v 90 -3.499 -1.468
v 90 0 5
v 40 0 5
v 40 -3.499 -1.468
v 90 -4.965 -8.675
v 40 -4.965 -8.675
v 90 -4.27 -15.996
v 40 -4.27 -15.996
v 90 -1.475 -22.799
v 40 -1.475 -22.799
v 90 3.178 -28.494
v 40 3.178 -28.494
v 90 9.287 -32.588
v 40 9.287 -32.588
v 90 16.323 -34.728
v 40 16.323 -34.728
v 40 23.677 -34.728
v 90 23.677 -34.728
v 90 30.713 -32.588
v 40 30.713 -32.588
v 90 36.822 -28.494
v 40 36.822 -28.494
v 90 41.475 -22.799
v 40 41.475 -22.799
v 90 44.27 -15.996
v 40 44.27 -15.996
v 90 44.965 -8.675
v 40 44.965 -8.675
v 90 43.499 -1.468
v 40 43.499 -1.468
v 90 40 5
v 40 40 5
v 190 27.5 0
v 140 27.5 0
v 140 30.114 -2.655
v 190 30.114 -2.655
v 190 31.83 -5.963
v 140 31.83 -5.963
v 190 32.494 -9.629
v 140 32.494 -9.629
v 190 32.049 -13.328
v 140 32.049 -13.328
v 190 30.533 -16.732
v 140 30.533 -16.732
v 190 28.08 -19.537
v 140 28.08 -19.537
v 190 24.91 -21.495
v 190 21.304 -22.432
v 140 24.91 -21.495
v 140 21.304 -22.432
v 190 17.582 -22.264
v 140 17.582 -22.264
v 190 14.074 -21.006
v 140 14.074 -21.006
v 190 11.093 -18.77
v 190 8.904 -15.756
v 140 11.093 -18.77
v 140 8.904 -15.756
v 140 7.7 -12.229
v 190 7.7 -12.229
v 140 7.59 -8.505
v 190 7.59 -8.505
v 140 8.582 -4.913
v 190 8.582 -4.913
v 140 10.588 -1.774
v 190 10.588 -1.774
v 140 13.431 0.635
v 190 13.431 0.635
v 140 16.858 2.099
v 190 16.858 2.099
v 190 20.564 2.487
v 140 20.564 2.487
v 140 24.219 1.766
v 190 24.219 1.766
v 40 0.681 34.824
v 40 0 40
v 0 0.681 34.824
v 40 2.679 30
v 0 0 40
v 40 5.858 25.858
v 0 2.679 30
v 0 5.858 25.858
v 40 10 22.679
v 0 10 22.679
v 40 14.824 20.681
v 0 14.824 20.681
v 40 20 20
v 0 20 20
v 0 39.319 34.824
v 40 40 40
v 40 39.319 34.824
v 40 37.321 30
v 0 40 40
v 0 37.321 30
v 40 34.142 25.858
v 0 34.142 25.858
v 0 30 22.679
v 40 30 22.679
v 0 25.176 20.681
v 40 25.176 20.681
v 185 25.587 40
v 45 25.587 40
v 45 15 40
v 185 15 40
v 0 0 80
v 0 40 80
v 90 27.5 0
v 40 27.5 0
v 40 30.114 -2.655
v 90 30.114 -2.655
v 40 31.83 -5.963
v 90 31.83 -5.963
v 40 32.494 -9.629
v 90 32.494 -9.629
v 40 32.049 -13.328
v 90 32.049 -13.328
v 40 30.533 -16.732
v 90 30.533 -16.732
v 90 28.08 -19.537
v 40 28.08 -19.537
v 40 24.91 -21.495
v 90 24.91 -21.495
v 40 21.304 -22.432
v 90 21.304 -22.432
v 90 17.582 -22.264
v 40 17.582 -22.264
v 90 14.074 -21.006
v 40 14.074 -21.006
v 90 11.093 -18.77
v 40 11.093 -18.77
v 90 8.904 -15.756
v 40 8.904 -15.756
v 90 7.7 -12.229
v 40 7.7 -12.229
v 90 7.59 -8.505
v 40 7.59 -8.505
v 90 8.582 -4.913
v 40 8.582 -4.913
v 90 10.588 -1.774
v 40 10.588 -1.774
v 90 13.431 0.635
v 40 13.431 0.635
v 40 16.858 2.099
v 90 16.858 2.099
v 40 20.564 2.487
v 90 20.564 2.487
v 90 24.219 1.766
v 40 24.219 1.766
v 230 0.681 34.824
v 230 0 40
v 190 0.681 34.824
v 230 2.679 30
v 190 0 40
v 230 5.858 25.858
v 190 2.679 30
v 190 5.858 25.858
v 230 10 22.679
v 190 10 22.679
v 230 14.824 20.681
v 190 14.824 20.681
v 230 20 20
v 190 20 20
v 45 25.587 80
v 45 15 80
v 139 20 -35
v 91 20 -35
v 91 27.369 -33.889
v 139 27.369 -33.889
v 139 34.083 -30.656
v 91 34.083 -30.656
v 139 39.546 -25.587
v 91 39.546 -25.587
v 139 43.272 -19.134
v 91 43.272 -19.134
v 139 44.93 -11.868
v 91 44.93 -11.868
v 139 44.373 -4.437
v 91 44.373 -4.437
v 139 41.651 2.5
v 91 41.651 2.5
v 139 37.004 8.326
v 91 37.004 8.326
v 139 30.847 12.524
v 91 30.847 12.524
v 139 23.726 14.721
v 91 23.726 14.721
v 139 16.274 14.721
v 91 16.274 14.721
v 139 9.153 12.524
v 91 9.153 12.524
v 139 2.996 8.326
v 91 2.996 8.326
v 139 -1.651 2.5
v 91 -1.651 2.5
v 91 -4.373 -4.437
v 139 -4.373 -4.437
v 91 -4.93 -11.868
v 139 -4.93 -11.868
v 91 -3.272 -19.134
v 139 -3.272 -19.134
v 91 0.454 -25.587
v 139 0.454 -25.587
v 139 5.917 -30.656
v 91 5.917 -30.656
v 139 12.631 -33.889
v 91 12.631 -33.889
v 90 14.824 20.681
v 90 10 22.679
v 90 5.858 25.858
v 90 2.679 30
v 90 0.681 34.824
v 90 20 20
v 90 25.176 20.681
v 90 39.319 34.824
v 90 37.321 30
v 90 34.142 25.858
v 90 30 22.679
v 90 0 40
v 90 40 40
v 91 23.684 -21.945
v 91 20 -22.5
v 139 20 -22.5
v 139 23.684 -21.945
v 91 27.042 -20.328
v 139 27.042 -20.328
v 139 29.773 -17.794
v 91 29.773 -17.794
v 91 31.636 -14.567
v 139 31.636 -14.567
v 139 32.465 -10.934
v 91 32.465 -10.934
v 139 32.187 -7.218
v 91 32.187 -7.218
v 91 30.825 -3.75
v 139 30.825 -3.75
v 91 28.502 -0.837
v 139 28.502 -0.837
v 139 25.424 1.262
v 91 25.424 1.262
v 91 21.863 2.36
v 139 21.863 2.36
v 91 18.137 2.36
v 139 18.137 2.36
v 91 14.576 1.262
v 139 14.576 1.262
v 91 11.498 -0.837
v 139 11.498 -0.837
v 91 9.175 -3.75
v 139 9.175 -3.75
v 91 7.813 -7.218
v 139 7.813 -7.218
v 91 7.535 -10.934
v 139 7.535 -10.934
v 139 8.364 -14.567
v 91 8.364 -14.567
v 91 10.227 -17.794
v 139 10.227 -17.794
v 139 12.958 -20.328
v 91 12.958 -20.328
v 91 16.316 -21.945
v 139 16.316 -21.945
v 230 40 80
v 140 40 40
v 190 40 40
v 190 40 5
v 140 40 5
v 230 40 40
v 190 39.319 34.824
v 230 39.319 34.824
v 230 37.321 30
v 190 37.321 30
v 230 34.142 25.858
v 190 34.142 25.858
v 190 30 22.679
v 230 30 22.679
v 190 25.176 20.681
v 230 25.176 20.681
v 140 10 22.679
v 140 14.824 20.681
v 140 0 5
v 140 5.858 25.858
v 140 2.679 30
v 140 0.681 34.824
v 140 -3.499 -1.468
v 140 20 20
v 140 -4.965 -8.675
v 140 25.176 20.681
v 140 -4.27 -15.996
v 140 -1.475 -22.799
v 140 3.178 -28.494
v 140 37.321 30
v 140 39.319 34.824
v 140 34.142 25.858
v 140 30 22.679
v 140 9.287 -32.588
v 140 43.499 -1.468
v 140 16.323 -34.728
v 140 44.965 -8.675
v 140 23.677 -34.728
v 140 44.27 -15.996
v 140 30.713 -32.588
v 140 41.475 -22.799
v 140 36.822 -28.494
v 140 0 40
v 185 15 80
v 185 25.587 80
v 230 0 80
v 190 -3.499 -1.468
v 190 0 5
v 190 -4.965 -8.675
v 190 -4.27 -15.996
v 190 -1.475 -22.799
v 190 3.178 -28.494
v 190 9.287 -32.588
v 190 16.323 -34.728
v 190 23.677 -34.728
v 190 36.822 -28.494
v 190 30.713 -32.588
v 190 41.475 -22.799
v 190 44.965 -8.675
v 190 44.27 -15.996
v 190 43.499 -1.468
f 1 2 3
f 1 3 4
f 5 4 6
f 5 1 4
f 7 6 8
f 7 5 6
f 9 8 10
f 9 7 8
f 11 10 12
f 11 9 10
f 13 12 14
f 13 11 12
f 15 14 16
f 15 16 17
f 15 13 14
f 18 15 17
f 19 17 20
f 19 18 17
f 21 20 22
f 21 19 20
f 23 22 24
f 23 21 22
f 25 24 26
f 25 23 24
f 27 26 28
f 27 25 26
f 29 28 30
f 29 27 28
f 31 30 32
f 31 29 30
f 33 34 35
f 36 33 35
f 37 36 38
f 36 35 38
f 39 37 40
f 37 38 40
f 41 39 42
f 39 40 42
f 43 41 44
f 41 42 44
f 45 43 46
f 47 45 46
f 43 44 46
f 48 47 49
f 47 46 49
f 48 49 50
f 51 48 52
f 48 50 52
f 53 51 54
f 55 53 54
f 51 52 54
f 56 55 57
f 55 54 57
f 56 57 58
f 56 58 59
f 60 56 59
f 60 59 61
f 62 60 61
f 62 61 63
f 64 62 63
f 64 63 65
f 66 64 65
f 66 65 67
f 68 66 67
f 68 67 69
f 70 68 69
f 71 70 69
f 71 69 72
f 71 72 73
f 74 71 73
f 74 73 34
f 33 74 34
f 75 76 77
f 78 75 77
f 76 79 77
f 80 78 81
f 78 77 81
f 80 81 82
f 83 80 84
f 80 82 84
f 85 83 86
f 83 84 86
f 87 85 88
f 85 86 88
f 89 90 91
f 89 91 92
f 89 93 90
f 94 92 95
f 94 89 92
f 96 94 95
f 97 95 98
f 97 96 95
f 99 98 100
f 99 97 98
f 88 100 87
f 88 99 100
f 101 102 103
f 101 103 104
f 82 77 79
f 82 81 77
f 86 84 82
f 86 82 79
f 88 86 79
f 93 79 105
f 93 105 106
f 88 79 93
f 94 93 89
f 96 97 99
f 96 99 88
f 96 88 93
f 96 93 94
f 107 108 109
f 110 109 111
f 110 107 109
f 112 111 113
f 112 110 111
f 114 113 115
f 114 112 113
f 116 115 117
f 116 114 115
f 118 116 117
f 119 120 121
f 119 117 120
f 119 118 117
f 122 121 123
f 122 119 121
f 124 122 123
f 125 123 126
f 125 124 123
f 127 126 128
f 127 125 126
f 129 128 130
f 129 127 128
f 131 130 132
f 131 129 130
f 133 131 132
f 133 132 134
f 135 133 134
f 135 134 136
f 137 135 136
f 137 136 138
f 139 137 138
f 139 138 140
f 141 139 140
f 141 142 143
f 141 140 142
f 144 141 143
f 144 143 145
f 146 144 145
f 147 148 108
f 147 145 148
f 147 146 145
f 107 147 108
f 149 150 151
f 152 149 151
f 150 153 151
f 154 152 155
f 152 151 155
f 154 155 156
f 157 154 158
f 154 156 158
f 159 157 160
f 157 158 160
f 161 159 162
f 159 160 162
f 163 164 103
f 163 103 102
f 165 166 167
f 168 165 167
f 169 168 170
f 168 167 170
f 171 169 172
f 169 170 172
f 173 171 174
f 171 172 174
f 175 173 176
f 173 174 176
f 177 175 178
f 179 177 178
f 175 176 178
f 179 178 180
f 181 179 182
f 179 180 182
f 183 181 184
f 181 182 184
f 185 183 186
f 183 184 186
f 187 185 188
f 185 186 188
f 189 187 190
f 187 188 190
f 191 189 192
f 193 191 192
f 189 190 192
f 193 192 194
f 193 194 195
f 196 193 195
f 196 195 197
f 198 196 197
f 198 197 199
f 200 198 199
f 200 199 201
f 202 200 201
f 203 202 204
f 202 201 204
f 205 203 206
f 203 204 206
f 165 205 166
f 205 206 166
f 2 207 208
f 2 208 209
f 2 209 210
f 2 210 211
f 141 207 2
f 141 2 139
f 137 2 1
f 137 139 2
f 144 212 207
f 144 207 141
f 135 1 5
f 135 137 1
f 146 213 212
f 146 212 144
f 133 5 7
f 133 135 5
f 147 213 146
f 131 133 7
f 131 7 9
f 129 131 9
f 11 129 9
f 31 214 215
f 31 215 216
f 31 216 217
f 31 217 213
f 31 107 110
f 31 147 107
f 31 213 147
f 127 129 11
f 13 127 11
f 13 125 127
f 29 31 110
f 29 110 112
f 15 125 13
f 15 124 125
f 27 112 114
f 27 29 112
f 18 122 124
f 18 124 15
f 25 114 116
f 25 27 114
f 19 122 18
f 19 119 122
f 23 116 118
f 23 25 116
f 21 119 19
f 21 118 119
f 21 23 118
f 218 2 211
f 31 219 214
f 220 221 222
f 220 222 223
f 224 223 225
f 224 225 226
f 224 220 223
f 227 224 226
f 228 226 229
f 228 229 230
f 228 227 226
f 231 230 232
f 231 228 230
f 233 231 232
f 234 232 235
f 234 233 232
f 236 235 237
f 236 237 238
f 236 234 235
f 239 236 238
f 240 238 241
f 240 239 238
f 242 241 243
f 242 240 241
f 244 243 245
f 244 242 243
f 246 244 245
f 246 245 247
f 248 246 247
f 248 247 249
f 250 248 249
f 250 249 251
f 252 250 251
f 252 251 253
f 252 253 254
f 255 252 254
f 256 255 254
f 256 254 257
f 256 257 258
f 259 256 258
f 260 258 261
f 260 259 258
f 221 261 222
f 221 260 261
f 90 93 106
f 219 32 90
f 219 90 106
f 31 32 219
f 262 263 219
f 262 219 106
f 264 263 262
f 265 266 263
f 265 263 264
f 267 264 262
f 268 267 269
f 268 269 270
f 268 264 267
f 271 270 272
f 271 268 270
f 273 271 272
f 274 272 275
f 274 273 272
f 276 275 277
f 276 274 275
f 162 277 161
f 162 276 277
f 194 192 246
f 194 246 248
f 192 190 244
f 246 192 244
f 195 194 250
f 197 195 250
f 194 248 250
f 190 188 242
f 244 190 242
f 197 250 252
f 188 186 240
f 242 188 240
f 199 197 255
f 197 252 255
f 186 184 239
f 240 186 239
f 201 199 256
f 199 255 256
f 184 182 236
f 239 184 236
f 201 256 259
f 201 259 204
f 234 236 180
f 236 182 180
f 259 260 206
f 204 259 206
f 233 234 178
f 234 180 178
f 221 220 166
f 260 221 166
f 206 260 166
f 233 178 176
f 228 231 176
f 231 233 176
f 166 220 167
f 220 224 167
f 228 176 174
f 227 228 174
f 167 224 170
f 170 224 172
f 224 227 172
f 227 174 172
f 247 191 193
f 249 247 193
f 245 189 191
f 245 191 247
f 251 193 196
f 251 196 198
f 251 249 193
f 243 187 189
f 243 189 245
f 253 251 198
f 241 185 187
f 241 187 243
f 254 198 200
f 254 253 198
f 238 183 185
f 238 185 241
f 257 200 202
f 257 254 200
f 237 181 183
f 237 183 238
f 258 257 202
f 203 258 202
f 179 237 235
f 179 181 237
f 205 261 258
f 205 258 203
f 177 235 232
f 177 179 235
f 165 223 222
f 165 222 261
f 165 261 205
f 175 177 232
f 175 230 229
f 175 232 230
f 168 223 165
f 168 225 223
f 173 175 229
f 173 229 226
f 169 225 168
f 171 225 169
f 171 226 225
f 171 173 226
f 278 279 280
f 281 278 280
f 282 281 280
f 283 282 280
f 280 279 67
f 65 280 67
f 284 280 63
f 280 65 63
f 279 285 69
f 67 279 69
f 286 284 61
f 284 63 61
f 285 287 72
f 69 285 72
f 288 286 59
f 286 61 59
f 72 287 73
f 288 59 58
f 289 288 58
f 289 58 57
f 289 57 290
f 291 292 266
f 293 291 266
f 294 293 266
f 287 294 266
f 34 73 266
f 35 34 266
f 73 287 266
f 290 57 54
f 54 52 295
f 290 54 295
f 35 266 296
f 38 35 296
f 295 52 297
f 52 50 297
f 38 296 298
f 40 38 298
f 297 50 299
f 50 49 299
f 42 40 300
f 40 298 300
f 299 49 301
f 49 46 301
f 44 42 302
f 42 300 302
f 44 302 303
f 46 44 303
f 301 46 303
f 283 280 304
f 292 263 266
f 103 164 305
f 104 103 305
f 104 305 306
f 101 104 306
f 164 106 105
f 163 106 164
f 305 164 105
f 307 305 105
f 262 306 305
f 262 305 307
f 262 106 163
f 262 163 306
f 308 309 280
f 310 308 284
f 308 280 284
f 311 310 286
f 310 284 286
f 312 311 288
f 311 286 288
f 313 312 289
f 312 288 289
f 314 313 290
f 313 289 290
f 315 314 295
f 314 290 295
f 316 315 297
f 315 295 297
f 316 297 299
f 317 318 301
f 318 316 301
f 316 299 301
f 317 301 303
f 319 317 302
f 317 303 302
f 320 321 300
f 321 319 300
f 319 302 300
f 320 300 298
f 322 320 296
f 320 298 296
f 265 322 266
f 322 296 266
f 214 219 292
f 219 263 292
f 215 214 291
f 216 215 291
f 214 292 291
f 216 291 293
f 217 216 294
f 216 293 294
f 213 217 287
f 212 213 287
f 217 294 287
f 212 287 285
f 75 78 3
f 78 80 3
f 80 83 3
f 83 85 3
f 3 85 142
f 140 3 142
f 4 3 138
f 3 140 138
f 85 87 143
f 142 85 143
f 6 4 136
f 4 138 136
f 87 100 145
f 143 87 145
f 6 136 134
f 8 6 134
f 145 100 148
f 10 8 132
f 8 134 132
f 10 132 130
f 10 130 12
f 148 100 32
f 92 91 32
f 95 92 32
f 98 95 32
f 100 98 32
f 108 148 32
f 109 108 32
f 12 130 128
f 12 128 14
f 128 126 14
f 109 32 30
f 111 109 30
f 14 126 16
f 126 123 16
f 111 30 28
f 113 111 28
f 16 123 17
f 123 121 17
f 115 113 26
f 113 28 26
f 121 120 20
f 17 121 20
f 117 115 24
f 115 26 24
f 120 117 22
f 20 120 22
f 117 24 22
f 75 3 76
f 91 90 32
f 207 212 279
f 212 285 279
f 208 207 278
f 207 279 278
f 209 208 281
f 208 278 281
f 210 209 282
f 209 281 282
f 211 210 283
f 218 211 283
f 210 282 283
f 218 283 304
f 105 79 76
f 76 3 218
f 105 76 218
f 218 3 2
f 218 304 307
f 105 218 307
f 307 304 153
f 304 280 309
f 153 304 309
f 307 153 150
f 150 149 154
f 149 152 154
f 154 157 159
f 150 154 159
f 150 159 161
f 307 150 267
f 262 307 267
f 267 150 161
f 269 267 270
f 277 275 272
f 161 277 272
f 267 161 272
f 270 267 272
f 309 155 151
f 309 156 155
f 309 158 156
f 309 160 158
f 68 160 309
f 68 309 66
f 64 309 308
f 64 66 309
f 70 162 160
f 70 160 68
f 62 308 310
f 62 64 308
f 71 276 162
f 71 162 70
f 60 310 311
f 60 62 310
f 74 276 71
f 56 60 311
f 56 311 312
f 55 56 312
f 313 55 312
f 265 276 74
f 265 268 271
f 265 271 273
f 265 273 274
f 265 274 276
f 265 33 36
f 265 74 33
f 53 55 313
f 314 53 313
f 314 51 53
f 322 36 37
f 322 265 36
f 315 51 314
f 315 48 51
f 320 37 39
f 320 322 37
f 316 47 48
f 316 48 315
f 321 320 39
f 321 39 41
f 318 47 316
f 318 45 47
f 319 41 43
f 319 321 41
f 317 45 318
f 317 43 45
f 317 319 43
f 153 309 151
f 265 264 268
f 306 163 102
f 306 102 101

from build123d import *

# Parameters (mm, degrees)
SKETCH2_W            = 230
SKETCH2_H            = 40
BOSS_EXTRUDE1_DEPTH  = 80
SKETCH20_W           = 140
SKETCH20_H           = 10.587082732
CUT_EXTRUDE7_DEPTH   = 40
SKETCH6_R            = 25
BOSS_EXTRUDE3_DEPTH  = 50
SKETCH7_R            = 12.5
CUT_EXTRUDE2_DEPTH   = 50
SKETCH8_R            = 26.5
CUT_EXTRUDE3_DEPTH   = 25
CUT_EXTRUDE4_START   = 40
SKETCH11_R           = 26.5
CUT_EXTRUDE4_DEPTH   = 40
SKETCH14_W           = 12.614661349
SKETCH14_H           = 40
CUT_EXTRUDE6_DEPTH   = 50
FILLET3_R            = 20
FILLET3_OF_MIRROR5_R = 20
FILLET3_OF_MIRROR8_R = 20
SKETCH21_R           = 25
BOSS_EXTRUDE5_DEPTH  = 48
SKETCH22_R           = 12.5
CUT_EXTRUDE8_DEPTH   = 48


with BuildPart() as part:
    # Sketch2 → Boss-Extrude1 (new body)
    with BuildSketch(Plane.XY):
        with Locations((115, 20)):
            Rectangle(SKETCH2_W, SKETCH2_H)
    extrude(amount=BOSS_EXTRUDE1_DEPTH)

    # Sketch20 → Cut-Extrude7 (cut)
    with BuildSketch(Plane.XY.offset(80)):
        with Locations((115, 20.293541366)):
            Rectangle(SKETCH20_W, SKETCH20_H)
    extrude(amount=-CUT_EXTRUDE7_DEPTH, mode=Mode.SUBTRACT)

    # Sketch6 → Boss-Extrude3 (add)
    with BuildSketch(Plane(origin=(140, 0, 0), x_dir=(0, 0, -1), z_dir=(1, 0, 0))):
        with Locations((10, 20)):
            Circle(SKETCH6_R)
    boss_extrude3 = extrude(amount=BOSS_EXTRUDE3_DEPTH)

    # Sketch7 → Cut-Extrude2 (cut)
    with BuildSketch(Plane.ZY.offset(-140)):
        with Locations(Location((-10, 20, 0), (0, 0, 36.869897646))):
            Circle(SKETCH7_R)
    cut_extrude2 = extrude(amount=-CUT_EXTRUDE2_DEPTH, mode=Mode.SUBTRACT)

    # Sketch8 → Cut-Extrude3 (cut)
    with BuildSketch(Plane.ZY.offset(-140)):
        with Locations((-10, 20)):
            Circle(SKETCH8_R)
    cut_extrude3 = extrude(amount=CUT_EXTRUDE3_DEPTH, mode=Mode.SUBTRACT)

    # Sketch11 → Cut-Extrude4 (cut)
    with BuildSketch(Plane(origin=(190, 0, 0), x_dir=(0, 0, -1), z_dir=(1, 0, 0)).offset(CUT_EXTRUDE4_START)):
        with Locations((10, 20)):
            Circle(SKETCH11_R)
    cut_extrude4 = extrude(amount=-CUT_EXTRUDE4_DEPTH, mode=Mode.SUBTRACT)

    # Mirror1: Boss-Extrude3, Cut-Extrude2, Cut-Extrude3, Cut-Extrude4 across plane
    add(boss_extrude3.mirror(Plane(origin=(115, 0, 0), x_dir=(0, 0, 1), z_dir=(1, 0, 0))))
    add(cut_extrude2.mirror(Plane(origin=(115, 0, 0), x_dir=(0, 0, 1), z_dir=(1, 0, 0))), mode=Mode.SUBTRACT)
    add(cut_extrude3.mirror(Plane(origin=(115, 0, 0), x_dir=(0, 0, 1), z_dir=(1, 0, 0))), mode=Mode.SUBTRACT)
    add(cut_extrude4.mirror(Plane(origin=(115, 0, 0), x_dir=(0, 0, 1), z_dir=(1, 0, 0))), mode=Mode.SUBTRACT)

    # Sketch14 → Cut-Extrude6 (cut)
    with BuildSketch(Plane(origin=(90, 0, 0), x_dir=(0, 0, -1), z_dir=(1, 0, 0))):
        with Locations((-13.692669326, 20)):
            Rectangle(SKETCH14_W, SKETCH14_H)
    cut_extrude6 = extrude(amount=CUT_EXTRUDE6_DEPTH, mode=Mode.SUBTRACT)

    # Fillet3
    fillet3_edges = [part.edges().sort_by_distance(p)[0] for p in [
        (115, 40, 20),
        (115, 0, 20),
    ]]
    fillet(fillet3_edges, radius=FILLET3_R - 0.0001)  # a hair under: the kernel refuses the full size

    # Mirror5: Cut-Extrude6 across plane
    add(cut_extrude6.mirror(Plane.ZY.offset(-165)), mode=Mode.SUBTRACT)

    # Fillet3 of Mirror5
    fillet3_of_mirror5_edges = [part.edges().sort_by_distance(p)[0] for p in [
        (210, 40, 20),
        (210, 0, 20),
    ]]
    fillet(fillet3_of_mirror5_edges, radius=FILLET3_OF_MIRROR5_R - 0.0001)  # a hair under: the kernel refuses the full size

    # Mirror8: Cut-Extrude6 across plane
    add(cut_extrude6.mirror(Plane(origin=(65, 0, 0), x_dir=(0, 0, 1), z_dir=(1, 0, 0))), mode=Mode.SUBTRACT)

    # Fillet3 of Mirror8
    fillet3_of_mirror8_edges = [part.edges().sort_by_distance(p)[0] for p in [
        (20, 40, 20),
        (20, 0, 20),
    ]]
    fillet(fillet3_of_mirror8_edges, radius=FILLET3_OF_MIRROR8_R - 0.0001)  # a hair under: the kernel refuses the full size


with BuildPart() as body_2:
    # Sketch21 → Boss-Extrude5 (new body)
    with BuildSketch(Plane(origin=(91, 0, 0), x_dir=(0, 0, -1), z_dir=(1, 0, 0))):
        with Locations((10, 20)):
            Circle(SKETCH21_R)
    extrude(amount=BOSS_EXTRUDE5_DEPTH)

    # Sketch22 → Cut-Extrude8 (cut)
    with BuildSketch(Plane(origin=(91, 0, 0), x_dir=(0, 0, -1), z_dir=(1, 0, 0))):
        with Locations((10, 20)):
            Circle(SKETCH22_R)
    extrude(amount=CUT_EXTRUDE8_DEPTH, mode=Mode.SUBTRACT)


solid = Compound([part.part, body_2.part])
